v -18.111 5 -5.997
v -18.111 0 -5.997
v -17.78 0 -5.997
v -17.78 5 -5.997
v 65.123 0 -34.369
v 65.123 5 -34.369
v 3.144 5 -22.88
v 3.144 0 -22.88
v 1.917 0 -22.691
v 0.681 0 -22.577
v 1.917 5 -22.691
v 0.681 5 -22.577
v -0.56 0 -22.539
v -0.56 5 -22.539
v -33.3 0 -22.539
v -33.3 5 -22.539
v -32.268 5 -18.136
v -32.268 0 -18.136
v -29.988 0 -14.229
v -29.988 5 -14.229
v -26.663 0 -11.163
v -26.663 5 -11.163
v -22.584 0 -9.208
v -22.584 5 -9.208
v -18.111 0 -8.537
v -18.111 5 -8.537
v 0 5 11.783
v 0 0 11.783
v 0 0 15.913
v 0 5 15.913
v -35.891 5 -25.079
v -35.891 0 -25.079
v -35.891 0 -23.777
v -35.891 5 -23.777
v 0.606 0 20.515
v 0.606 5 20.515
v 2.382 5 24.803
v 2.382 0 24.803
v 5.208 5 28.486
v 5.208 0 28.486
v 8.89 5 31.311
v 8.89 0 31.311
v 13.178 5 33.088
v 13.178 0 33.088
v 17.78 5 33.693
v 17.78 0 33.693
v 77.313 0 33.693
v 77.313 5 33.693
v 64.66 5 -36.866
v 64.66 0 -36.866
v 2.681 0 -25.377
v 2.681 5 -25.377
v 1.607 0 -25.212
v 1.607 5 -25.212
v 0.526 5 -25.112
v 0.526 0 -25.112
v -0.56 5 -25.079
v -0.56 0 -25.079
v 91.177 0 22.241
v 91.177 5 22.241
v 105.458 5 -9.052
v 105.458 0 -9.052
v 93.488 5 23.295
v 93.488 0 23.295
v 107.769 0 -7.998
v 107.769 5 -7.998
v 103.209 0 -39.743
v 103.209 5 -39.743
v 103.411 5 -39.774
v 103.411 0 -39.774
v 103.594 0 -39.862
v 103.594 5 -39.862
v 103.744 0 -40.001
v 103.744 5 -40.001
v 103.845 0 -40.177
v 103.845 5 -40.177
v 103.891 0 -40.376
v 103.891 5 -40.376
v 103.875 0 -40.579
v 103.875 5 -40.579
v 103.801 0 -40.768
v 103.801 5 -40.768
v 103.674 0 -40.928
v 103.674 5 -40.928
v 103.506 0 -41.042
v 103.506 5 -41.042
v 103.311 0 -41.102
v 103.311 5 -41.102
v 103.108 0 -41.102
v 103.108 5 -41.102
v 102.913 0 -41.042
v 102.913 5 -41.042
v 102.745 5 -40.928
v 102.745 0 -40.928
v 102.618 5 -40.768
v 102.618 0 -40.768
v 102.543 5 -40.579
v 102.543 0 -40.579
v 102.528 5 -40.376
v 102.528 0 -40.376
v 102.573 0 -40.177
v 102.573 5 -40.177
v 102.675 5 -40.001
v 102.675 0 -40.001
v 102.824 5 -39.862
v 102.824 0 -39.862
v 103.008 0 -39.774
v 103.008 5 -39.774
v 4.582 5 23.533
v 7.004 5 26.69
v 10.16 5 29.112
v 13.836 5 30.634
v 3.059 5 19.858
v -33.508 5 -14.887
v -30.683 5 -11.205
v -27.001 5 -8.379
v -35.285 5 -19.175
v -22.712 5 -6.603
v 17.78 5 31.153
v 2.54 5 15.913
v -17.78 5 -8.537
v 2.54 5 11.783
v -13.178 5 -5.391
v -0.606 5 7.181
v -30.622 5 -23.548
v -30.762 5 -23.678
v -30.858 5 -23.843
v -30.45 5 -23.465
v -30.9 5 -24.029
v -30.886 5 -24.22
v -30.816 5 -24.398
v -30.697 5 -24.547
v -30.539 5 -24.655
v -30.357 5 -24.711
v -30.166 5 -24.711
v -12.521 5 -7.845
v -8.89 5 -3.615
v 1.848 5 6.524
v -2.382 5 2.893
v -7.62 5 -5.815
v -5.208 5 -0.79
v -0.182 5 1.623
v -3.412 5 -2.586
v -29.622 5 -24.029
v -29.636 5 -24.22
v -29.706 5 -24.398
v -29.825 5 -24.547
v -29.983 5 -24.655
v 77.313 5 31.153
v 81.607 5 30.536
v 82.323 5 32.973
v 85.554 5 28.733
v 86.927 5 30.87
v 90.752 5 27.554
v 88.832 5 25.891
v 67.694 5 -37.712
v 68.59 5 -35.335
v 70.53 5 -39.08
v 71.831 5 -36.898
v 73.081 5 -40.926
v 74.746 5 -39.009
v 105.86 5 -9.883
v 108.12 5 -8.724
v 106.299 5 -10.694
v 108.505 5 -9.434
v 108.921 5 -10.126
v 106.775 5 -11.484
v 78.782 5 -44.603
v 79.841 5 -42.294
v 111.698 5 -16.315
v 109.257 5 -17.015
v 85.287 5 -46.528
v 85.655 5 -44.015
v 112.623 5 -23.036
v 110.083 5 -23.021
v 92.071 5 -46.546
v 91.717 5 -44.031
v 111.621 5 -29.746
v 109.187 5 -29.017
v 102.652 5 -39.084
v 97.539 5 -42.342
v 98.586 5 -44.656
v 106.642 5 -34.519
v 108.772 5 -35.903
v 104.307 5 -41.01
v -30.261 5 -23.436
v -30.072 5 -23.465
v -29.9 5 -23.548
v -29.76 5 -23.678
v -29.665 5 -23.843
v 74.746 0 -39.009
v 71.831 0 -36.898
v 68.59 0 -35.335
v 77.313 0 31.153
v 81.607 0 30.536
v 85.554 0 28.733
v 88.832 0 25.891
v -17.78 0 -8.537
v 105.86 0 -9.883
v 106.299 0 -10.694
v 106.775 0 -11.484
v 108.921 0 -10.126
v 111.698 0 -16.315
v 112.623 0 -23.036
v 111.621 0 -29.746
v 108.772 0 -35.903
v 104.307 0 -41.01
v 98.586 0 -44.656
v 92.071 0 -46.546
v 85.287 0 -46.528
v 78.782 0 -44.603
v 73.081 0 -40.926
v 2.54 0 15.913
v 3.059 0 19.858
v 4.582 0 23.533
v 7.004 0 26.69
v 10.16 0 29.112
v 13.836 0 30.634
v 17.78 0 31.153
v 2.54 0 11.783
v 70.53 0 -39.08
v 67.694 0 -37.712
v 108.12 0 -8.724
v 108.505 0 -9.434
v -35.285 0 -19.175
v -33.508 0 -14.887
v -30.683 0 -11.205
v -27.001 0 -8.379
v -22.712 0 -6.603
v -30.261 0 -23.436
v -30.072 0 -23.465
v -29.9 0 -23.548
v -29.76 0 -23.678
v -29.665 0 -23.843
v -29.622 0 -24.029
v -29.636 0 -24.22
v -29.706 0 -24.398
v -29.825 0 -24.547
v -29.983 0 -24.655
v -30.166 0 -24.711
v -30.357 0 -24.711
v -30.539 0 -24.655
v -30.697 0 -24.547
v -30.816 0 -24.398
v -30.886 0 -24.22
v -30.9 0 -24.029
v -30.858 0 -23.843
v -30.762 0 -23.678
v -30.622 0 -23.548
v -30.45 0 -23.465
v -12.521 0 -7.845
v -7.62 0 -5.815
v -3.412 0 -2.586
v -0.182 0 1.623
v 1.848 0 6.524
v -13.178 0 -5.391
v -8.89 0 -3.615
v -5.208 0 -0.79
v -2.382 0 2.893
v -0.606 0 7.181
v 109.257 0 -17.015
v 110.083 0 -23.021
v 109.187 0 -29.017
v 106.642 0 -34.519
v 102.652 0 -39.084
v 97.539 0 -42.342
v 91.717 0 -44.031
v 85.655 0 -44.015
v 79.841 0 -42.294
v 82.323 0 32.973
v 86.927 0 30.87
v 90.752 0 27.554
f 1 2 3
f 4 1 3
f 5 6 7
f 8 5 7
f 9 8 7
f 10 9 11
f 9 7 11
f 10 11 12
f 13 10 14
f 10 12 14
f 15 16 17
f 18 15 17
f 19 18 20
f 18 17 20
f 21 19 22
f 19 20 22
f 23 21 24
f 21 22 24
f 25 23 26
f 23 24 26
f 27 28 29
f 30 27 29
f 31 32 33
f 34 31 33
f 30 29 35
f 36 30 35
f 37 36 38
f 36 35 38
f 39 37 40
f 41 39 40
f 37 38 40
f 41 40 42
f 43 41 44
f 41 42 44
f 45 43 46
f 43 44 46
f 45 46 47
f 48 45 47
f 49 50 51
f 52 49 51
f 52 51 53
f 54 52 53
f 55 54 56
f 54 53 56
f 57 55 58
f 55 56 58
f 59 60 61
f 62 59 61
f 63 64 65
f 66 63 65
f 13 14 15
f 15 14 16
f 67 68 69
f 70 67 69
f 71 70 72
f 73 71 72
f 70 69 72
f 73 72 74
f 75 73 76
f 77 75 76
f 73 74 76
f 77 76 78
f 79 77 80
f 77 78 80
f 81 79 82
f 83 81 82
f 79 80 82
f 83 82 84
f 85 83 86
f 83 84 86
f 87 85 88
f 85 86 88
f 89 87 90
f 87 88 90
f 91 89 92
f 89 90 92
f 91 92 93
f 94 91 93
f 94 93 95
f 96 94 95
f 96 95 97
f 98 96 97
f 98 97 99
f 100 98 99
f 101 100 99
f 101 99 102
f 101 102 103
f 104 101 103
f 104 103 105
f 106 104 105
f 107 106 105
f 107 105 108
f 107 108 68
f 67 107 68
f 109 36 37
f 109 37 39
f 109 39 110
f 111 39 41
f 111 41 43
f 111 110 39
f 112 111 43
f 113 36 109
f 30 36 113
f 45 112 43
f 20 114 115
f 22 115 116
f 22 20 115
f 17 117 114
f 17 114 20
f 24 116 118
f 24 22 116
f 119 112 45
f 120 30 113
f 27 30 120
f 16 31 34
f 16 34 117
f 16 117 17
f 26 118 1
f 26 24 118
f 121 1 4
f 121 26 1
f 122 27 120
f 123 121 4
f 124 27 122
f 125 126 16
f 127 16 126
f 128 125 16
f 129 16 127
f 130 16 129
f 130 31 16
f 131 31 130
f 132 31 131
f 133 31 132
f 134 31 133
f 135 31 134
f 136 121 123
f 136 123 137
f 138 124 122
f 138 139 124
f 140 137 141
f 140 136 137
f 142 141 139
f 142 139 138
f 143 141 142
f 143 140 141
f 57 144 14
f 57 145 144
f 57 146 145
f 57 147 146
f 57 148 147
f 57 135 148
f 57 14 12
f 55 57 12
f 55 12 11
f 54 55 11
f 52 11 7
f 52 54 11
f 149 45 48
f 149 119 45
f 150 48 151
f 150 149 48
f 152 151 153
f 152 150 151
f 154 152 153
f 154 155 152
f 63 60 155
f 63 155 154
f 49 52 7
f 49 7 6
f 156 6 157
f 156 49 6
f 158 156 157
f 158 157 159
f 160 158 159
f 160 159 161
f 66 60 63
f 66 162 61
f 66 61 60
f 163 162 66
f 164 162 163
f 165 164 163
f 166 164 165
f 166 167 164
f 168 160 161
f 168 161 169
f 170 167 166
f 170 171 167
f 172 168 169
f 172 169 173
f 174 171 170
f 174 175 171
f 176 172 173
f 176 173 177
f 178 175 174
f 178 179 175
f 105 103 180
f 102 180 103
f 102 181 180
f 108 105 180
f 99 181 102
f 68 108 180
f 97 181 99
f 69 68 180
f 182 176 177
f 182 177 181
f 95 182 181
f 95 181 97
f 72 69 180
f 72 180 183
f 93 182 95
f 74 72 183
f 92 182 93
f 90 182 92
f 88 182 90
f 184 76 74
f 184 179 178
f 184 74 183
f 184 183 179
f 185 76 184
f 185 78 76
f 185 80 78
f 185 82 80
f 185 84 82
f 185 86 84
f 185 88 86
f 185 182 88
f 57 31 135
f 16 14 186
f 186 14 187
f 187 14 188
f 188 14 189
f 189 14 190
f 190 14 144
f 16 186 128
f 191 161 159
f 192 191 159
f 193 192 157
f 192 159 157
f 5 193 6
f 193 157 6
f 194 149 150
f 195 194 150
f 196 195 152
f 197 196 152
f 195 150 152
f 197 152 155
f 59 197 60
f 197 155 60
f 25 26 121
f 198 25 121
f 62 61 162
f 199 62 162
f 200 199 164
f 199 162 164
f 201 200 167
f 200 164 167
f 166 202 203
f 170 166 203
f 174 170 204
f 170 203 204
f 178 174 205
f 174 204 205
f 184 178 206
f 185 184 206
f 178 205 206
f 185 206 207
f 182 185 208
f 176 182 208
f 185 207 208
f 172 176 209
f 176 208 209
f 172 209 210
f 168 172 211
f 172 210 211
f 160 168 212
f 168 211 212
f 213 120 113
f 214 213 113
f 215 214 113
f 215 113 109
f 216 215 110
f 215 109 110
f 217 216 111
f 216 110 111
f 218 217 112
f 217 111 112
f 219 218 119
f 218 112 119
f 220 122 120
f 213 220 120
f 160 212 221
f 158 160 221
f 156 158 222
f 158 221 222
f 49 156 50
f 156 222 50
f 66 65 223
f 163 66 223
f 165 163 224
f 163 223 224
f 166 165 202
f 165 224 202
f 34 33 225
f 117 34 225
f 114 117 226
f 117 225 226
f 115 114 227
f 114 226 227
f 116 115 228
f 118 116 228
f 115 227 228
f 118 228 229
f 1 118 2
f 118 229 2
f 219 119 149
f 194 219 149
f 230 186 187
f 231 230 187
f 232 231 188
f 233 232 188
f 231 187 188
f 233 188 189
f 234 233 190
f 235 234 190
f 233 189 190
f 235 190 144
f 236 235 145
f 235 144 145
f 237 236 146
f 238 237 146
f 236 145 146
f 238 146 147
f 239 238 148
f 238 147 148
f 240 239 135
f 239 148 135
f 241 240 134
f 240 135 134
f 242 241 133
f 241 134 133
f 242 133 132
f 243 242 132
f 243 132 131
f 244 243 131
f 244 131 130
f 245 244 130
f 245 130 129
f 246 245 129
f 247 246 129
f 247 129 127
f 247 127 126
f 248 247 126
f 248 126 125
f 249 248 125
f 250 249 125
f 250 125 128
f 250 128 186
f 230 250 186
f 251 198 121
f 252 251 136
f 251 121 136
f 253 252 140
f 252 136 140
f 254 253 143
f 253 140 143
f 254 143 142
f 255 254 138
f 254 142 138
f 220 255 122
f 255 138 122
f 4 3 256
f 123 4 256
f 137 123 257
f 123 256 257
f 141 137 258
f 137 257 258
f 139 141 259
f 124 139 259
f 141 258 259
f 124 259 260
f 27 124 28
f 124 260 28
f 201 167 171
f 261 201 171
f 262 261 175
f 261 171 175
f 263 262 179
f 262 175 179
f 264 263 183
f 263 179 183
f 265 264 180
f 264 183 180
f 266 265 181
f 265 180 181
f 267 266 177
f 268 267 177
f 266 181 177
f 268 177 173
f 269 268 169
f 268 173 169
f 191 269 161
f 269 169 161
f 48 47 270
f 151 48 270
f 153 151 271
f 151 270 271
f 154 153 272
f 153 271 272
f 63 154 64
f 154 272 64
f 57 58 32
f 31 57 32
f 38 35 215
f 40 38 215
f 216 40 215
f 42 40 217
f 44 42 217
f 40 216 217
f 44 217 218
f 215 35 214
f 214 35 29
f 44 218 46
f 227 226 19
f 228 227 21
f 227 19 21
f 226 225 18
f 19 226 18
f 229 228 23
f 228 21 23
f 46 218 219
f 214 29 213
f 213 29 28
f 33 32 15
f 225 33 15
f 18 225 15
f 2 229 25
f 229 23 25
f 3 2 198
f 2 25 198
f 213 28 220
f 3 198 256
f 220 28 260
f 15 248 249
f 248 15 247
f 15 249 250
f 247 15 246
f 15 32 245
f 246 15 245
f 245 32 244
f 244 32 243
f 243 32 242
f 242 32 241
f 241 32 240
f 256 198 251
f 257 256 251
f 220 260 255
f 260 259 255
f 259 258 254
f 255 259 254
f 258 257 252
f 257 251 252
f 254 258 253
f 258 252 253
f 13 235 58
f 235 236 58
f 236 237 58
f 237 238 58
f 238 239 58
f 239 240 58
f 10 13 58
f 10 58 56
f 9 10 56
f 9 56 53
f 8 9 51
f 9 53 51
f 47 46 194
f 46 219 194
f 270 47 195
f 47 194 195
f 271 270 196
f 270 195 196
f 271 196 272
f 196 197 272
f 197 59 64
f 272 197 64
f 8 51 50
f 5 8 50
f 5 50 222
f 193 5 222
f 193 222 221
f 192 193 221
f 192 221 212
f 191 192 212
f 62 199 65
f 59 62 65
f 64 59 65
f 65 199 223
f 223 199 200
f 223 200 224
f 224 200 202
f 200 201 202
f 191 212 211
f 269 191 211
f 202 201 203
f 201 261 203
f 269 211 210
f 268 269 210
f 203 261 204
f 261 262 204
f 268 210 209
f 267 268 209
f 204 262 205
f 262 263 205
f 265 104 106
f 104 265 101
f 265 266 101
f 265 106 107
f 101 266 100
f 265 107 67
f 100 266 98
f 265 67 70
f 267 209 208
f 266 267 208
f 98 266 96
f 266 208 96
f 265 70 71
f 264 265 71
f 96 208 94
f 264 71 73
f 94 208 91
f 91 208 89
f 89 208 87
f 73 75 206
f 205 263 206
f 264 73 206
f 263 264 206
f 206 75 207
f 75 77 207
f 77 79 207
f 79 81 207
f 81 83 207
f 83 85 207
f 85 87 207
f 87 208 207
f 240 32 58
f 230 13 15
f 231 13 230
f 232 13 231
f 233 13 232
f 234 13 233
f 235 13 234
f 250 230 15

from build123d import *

# Parameters (mm, degrees)
BOSS_EXTRUDE1_DEPTH = 5
CUT_EXTRUDE2_DEPTH  = 8.048
SKETCH3_R           = 0.640852302
SKETCH3_R_2         = 0.683244838
CUT_EXTRUDE3_DEPTH  = 8.048


with BuildPart() as part:
    # Sketch1 → Boss-Extrude1 (new body)
    with BuildSketch(Plane(origin=(0, 0, 0), x_dir=(1, 0, 0), z_dir=(0, 1, 0))):
        with BuildLine():
            Line((-0.55984013, 25.079292929), (-35.890546419, 25.079292929))
            Line((-35.890546419, 25.079292929), (-35.890546419, 23.777222222))
            ThreePointArc((-35.890546419, 23.777222222), (-30.682904989, 11.204863653), (-18.110546419, 5.997222222))
            Line((-18.110546419, 5.997222222), (-17.78, 5.997222222))
            ThreePointArc((-17.78, 5.997222222), (-5.207641431, 0.789580792), (0, -11.782777778))
            Line((0, -11.782777778), (0, -15.913484848))
            ThreePointArc((0, -15.913484848), (5.207641431, -28.485843418), (17.78, -33.693484848))
            Line((17.78, -33.693484848), (77.312672268, -33.693484848))
            ThreePointArc((77.312672268, -33.693484848), (86.927320297, -30.869652248), (93.487957466, -23.295120763))
            Line((93.487957466, -23.295120763), (107.768626914, 7.997929157))
            ThreePointArc((107.768626914, 7.997929157), (108.308432376, 9.081526458), (108.920724009, 10.125878891))
            ThreePointArc((108.920724009, 10.125878891), (104.307418831, 41.01014517), (73.08061258, 40.926123744))
            ThreePointArc((73.08061258, 40.926123744), (69.142100225, 38.332807414), (64.660382122, 36.866051805))
            Line((64.660382122, 36.866051805), (2.680771994, 25.377106766))
            ThreePointArc((2.680771994, 25.377106766), (1.067293855, 25.153902931), (-0.55984013, 25.079292929))
        make_face()
    extrude(amount=BOSS_EXTRUDE1_DEPTH)

    # Sketch2 → Cut-Extrude2 (cut)
    with BuildSketch(Plane(origin=(0, 5, 0), x_dir=(1, 0, 0), z_dir=(0, 1, 0))):
        with BuildLine():
            Line((-18.110546419, 8.537222222), (-17.78, 8.537222222))
            ThreePointArc((-17.78, 8.537222222), (-3.411590206, 2.585632016), (2.54, -11.782777778))
            Line((2.54, -11.782777778), (2.54, -15.913484848))
            ThreePointArc((2.54, -15.913484848), (7.003692655, -26.689792194), (17.78, -31.153484848))
            Line((17.78, -31.153484848), (77.312672268, -31.153484848))
            ThreePointArc((77.312672268, -31.153484848), (85.55379915, -28.733056905), (91.177202437, -22.240601346))
            Line((91.177202437, -22.240601346), (105.457871886, 9.052448573))
            ThreePointArc((105.457871886, 9.052448573), (106.074792413, 10.290845489), (106.77455428, 11.484391127))
            ThreePointArc((106.77455428, 11.484391127), (102.651926694, 39.083763644), (74.746447235, 39.008678854))
            ThreePointArc((74.746447235, 39.008678854), (70.245290257, 36.044888763), (65.123326712, 34.368596639))
            Line((65.123326712, 34.368596639), (3.143716583, 22.879651599))
            ThreePointArc((3.143716583, 22.879651599), (1.299741567, 22.624561503), (-0.55984013, 22.539292929))
            Line((-0.55984013, 22.539292929), (-33.300185357, 22.539292929))
            ThreePointArc((-33.300185357, 22.539292929), (-28.439911298, 12.571785095), (-18.110546419, 8.537222222))
        make_face()
    extrude(amount=-CUT_EXTRUDE2_DEPTH, mode=Mode.SUBTRACT)

    # Sketch3 → Cut-Extrude3 (cut)
    with BuildSketch(Plane(origin=(0, 5, 0), x_dir=(1, 0, 0), z_dir=(0, 1, 0))):
        with Locations(Location((-30.261155499, 24.077194613, 0), (0, 0, 270))):
            Circle(SKETCH3_R)
        with Locations(Location((103.209357625, 40.426722425, 0), (0, 0, 270))):
            Circle(SKETCH3_R_2)
    extrude(amount=-CUT_EXTRUDE3_DEPTH, mode=Mode.SUBTRACT)


solid = part.part
